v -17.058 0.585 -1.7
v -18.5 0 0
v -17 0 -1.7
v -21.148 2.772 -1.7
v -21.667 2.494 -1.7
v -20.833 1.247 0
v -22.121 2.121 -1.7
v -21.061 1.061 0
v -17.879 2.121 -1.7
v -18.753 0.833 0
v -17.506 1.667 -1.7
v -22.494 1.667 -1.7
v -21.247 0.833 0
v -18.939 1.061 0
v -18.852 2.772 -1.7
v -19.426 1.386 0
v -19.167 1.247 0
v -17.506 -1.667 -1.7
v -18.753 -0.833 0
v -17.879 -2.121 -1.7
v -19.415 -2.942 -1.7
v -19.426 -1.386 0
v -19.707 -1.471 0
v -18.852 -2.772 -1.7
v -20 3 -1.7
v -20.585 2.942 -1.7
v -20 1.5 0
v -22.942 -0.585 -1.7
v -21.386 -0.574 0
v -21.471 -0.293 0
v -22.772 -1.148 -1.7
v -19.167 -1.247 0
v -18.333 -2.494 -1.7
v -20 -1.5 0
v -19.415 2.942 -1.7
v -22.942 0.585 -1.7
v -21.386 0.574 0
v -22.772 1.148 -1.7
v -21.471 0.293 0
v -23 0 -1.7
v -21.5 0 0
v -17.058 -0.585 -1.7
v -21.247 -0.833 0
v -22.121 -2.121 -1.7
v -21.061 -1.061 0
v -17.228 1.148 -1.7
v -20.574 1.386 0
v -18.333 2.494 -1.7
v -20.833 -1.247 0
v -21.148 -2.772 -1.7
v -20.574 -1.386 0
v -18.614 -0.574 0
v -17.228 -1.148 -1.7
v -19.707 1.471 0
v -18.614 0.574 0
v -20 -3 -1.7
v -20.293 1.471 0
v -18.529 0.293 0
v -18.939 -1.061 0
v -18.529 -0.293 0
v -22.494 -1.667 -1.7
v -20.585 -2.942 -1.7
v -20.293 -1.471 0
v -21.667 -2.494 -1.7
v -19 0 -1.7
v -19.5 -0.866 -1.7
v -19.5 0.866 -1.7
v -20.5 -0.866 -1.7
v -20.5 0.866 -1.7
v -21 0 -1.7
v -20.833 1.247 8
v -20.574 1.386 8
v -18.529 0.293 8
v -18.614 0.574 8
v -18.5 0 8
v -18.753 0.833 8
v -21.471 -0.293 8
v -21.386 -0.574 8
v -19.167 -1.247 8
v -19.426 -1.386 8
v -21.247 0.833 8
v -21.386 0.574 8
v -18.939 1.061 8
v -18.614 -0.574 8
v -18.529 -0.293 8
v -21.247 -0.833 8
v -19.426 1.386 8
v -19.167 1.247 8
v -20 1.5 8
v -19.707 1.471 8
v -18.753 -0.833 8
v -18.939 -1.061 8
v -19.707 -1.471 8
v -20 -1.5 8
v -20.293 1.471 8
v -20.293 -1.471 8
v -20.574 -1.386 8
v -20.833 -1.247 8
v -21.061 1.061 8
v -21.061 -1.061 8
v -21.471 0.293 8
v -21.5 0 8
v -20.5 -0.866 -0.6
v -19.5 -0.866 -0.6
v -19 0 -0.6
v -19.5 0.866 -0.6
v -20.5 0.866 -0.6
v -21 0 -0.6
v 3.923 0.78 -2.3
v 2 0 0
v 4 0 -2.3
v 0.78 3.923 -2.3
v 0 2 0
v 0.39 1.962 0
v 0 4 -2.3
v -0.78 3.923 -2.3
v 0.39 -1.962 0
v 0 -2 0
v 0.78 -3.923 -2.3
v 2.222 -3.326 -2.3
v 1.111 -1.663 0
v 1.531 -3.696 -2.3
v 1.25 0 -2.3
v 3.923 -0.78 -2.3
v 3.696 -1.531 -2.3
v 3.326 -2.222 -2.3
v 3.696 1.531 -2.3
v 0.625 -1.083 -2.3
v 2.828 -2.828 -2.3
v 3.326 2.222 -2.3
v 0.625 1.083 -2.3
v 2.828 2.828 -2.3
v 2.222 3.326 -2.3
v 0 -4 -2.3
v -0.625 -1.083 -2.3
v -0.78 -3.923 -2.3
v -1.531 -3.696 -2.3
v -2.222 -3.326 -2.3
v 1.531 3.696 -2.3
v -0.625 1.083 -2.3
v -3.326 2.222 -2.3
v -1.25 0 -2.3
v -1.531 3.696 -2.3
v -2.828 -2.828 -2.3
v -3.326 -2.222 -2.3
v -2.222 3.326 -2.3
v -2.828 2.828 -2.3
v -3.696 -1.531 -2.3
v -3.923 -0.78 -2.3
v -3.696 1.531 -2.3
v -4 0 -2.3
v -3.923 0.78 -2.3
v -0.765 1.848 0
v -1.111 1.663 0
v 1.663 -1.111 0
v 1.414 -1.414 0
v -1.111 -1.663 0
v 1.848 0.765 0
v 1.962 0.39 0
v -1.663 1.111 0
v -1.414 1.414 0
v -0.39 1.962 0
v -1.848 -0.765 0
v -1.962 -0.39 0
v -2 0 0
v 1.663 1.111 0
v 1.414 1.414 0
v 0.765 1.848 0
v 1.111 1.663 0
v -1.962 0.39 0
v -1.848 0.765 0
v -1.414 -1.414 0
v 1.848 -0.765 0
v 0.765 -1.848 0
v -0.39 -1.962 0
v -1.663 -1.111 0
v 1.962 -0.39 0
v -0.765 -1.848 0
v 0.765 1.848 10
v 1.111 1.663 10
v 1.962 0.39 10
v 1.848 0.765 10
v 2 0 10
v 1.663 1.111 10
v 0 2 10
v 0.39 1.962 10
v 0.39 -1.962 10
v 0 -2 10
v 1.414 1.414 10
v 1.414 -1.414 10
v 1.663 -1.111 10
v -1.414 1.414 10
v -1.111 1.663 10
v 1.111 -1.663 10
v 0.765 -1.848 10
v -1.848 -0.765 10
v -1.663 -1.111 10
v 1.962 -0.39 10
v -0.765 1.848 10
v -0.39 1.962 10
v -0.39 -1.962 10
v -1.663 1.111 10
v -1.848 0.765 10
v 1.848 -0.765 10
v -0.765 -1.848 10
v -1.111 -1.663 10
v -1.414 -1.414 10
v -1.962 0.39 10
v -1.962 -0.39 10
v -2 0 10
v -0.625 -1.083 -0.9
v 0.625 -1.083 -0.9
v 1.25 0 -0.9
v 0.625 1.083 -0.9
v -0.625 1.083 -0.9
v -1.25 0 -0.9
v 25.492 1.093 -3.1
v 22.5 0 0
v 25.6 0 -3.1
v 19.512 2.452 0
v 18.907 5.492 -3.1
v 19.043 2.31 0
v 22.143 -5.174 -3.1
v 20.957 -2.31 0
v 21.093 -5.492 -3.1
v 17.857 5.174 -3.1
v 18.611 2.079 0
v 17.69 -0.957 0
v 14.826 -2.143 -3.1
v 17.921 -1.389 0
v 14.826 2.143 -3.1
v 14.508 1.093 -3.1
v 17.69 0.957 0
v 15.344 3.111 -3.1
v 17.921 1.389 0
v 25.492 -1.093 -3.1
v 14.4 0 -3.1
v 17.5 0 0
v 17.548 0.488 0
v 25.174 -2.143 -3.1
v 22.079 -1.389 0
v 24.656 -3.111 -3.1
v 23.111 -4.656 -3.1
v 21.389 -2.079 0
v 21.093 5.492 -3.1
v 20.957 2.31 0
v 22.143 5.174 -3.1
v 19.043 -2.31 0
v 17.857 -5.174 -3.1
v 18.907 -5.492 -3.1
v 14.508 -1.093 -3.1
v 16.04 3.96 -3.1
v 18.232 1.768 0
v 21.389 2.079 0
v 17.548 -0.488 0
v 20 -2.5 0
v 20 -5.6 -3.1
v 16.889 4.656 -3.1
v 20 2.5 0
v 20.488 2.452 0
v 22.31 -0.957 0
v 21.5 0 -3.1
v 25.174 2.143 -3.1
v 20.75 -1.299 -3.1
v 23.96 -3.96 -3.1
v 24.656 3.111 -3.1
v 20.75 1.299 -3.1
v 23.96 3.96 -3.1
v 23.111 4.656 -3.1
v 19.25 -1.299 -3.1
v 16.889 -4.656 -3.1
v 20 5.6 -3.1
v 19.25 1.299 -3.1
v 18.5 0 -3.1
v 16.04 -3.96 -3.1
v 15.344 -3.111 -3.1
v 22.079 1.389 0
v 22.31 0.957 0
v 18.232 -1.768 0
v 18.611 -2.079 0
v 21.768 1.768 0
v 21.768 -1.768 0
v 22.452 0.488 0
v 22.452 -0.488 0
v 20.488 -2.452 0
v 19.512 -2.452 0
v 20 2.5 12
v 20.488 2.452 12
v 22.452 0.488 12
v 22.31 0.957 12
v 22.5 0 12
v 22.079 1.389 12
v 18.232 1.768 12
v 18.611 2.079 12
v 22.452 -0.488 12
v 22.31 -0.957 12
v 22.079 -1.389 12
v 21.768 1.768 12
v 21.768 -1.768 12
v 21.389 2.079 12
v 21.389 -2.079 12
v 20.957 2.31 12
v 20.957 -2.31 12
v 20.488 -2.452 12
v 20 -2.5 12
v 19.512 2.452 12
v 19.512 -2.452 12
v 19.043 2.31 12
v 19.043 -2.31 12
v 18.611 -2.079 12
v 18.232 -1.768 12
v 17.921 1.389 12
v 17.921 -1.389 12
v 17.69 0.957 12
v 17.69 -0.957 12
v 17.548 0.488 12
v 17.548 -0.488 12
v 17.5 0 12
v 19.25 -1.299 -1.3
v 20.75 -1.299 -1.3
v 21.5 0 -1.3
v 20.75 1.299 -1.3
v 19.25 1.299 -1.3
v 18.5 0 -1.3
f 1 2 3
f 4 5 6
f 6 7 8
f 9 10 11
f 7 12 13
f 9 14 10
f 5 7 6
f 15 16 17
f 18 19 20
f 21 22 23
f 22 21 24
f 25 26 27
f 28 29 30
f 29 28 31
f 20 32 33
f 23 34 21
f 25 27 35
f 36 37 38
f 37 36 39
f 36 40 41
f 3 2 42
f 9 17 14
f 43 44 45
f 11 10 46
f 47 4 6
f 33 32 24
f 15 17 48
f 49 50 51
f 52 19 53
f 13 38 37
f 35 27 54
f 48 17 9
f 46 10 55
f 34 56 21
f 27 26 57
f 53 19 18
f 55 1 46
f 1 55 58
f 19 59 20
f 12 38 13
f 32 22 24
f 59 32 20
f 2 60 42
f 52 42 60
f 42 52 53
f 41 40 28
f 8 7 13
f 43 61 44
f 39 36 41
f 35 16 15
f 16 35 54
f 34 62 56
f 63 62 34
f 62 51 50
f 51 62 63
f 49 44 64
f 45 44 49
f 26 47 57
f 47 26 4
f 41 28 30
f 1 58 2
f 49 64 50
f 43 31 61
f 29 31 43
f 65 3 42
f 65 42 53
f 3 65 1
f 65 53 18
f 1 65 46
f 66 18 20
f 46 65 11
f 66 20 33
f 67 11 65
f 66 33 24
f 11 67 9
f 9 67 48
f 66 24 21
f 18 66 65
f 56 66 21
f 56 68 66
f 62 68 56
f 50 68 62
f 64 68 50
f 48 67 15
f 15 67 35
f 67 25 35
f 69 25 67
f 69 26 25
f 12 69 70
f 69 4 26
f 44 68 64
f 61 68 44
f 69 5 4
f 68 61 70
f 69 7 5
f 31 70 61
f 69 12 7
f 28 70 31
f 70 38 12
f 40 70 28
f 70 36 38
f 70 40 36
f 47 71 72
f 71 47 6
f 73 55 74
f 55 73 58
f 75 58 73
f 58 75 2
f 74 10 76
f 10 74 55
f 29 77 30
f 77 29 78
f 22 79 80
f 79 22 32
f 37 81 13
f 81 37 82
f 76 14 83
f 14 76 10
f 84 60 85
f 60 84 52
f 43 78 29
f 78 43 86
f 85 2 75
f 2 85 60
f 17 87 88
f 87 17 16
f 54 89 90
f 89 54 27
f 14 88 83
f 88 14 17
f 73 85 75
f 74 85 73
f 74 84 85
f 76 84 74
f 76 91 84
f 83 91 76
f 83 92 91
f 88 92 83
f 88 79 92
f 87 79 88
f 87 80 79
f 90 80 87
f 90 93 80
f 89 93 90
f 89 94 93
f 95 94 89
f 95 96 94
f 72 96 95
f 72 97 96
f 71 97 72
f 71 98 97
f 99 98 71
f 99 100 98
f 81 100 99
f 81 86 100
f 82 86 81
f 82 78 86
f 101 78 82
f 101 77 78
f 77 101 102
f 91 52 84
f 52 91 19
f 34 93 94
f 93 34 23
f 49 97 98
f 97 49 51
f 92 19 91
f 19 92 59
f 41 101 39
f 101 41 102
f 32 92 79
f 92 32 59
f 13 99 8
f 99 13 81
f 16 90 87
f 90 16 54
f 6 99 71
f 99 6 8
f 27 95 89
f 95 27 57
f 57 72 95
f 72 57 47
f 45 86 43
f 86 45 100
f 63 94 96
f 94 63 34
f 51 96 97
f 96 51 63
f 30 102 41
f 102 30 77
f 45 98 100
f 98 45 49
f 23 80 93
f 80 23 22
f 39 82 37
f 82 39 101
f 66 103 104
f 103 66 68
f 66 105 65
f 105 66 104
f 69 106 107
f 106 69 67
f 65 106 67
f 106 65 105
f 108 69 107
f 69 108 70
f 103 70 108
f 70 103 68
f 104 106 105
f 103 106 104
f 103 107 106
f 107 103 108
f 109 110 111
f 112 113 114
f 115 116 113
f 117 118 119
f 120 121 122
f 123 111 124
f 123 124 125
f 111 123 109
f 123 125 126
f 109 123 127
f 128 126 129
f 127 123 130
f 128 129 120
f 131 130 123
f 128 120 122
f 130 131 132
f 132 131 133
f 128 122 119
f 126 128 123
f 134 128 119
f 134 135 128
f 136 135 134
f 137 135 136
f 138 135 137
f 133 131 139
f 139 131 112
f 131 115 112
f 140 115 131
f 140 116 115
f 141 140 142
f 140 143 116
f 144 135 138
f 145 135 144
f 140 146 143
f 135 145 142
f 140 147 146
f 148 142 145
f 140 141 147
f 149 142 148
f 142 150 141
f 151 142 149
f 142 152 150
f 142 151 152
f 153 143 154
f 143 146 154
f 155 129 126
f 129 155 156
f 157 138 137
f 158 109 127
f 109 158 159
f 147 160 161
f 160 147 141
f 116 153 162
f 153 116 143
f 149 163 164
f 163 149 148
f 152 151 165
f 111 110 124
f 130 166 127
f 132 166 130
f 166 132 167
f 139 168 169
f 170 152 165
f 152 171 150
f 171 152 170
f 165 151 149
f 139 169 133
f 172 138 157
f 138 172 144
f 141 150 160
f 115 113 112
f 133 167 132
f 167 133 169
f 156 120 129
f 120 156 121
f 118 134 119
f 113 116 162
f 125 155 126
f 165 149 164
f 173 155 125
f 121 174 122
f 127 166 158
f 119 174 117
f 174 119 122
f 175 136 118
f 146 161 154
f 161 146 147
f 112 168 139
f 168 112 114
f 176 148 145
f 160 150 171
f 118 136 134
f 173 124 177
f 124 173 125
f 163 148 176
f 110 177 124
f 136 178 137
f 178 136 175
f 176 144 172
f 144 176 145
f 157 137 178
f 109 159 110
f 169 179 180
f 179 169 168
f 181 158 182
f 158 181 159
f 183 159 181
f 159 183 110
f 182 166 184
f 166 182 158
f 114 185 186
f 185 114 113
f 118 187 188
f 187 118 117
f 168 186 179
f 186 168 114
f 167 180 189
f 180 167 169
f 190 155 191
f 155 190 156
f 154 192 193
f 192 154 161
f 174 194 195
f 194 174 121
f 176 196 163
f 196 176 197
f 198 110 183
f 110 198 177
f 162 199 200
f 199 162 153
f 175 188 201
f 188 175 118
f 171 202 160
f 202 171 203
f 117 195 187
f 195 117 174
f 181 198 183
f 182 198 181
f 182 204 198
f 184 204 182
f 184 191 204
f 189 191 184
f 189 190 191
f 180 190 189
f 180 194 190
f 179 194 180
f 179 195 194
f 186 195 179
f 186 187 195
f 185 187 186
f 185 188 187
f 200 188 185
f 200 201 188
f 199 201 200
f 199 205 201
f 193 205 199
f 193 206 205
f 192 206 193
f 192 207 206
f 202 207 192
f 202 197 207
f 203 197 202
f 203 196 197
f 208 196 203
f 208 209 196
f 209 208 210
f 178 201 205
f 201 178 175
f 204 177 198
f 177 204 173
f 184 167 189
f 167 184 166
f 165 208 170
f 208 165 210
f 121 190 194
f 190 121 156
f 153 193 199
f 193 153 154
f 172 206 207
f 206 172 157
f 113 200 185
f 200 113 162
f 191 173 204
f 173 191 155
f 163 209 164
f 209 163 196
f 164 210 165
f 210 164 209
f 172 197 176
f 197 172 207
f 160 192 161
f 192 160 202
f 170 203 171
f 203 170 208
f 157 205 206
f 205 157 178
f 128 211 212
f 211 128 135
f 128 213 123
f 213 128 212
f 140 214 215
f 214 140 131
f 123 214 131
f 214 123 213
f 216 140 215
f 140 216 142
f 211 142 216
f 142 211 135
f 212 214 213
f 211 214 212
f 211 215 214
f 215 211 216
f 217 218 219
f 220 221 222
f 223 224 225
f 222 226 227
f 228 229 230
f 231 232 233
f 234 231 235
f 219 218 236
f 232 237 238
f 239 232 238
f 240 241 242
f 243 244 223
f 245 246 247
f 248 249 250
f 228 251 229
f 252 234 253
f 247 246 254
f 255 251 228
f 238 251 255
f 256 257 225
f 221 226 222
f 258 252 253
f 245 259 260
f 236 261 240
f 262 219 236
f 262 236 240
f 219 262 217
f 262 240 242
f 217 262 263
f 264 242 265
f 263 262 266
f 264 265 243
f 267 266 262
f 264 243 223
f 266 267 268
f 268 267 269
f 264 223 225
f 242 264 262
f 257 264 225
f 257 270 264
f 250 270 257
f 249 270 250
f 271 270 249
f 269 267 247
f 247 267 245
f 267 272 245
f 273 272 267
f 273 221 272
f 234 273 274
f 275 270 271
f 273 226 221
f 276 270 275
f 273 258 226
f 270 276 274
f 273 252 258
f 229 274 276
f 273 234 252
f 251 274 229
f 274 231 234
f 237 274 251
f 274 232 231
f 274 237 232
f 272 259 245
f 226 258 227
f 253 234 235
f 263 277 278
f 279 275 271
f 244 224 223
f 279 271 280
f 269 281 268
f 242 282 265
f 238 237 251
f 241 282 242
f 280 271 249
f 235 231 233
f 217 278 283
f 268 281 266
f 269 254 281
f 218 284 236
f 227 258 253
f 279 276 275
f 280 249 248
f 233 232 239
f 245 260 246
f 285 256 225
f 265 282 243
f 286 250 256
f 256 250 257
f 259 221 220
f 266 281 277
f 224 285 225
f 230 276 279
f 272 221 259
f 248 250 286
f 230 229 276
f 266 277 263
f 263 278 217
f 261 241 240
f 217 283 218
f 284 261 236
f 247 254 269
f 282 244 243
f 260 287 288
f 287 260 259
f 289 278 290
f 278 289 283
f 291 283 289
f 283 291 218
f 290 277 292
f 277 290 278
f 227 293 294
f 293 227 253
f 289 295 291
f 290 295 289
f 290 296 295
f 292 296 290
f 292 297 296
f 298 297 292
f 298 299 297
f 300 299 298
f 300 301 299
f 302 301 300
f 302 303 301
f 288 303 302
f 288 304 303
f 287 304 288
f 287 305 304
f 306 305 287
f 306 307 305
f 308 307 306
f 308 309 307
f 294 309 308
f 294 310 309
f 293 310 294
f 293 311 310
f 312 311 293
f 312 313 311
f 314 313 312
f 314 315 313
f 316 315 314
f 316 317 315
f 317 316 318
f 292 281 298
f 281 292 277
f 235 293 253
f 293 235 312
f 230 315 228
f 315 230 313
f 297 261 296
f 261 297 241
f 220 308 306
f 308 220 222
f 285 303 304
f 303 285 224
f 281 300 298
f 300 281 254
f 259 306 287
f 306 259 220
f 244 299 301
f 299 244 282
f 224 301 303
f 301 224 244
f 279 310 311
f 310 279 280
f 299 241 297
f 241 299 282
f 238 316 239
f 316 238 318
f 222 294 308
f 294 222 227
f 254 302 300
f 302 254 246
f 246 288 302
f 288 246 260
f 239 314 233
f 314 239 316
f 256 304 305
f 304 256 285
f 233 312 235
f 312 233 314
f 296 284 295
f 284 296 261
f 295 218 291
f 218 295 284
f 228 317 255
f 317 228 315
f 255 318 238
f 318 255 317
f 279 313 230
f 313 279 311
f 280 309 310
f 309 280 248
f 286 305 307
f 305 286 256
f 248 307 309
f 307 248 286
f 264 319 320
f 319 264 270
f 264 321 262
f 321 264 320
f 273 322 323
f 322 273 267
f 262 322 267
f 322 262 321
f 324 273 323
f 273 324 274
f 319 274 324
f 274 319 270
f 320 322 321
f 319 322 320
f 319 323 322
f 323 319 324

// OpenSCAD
// =======================================================================
// PARAMETRIC FLAT HEAD COUNTERSUNK SCREW (FHCS) LIBRARY
// =======================================================================

// 1. Render Example Setup
translate([-20, 0, 0]) m3_fhcs(length=8);
translate([0, 0, 0])   m4_fhcs(length=10);
translate([20, 0, 0])  m5_fhcs(length=12); // New M5 Option Added Below

// =======================================================================
// HARDWARE MODULE DEFINITIONS
// =======================================================================

module m3_fhcs(length=8) {
    // M3 Flat Head Countersunk Screw
    // head: 6mm dia at top (wide end flush with surface), tapers to 3mm at shaft
    // shaft: 3mm dia, variable length
    color("silver")
    difference() {
        union() {
            // Conical head (wide end at top, narrows toward shaft)
            translate([0, 0, -1.7])
                cylinder(d1=6, d2=3, h=1.7, $fn=32);
            // Shaft (goes up)
            cylinder(d=3, h=length, $fn=32);
        }
        // Hex drive recess (from the wide/top end)
        translate([0, 0, -1.8])
            cylinder(d=2, h=1.2, $fn=6);
    }
}

module m4_fhcs(length=10) {
    // M4 Flat Head Countersunk Screw
    // head: 8mm dia at top (wide end flush with surface), tapers to 4mm at shaft
    // shaft: 4mm dia, variable length
    color("silver")
    difference() {
        union() {
            // Conical head (wide end at top, narrows toward shaft)
            translate([0, 0, -2.3])
                cylinder(d1=8, d2=4, h=2.3, $fn=32);
            // Shaft (goes up)
            cylinder(d=4, h=length, $fn=32);
        }
        // Hex drive recess (from the wide/top end)
        translate([0, 0, -2.4])
            cylinder(d=2.5, h=1.5, $fn=6);
    }
}

module m5_fhcs(length=12) {
    // M5 Flat Head Countersunk Screw (ISO 10642 / DIN 7991 Standard)
    // head: 11.2mm dia at top (wide end flush with surface), tapers to 5mm at shaft
    // shaft: 5mm dia, variable length
    color("silver")
    difference() {
        union() {
            // Conical head (wide end at top, narrows toward shaft)
            translate([0, 0, -3.1])
                cylinder(d1=11.2, d2=5, h=3.1, $fn=32);
            // Shaft (goes up)
            cylinder(d=5, h=length, $fn=32);
        }
        // Hex drive recess (fits a standard 3mm hex allen key drive)
        translate([0, 0, -3.2])
            cylinder(d=3, h=1.9, $fn=6);
    }
}
